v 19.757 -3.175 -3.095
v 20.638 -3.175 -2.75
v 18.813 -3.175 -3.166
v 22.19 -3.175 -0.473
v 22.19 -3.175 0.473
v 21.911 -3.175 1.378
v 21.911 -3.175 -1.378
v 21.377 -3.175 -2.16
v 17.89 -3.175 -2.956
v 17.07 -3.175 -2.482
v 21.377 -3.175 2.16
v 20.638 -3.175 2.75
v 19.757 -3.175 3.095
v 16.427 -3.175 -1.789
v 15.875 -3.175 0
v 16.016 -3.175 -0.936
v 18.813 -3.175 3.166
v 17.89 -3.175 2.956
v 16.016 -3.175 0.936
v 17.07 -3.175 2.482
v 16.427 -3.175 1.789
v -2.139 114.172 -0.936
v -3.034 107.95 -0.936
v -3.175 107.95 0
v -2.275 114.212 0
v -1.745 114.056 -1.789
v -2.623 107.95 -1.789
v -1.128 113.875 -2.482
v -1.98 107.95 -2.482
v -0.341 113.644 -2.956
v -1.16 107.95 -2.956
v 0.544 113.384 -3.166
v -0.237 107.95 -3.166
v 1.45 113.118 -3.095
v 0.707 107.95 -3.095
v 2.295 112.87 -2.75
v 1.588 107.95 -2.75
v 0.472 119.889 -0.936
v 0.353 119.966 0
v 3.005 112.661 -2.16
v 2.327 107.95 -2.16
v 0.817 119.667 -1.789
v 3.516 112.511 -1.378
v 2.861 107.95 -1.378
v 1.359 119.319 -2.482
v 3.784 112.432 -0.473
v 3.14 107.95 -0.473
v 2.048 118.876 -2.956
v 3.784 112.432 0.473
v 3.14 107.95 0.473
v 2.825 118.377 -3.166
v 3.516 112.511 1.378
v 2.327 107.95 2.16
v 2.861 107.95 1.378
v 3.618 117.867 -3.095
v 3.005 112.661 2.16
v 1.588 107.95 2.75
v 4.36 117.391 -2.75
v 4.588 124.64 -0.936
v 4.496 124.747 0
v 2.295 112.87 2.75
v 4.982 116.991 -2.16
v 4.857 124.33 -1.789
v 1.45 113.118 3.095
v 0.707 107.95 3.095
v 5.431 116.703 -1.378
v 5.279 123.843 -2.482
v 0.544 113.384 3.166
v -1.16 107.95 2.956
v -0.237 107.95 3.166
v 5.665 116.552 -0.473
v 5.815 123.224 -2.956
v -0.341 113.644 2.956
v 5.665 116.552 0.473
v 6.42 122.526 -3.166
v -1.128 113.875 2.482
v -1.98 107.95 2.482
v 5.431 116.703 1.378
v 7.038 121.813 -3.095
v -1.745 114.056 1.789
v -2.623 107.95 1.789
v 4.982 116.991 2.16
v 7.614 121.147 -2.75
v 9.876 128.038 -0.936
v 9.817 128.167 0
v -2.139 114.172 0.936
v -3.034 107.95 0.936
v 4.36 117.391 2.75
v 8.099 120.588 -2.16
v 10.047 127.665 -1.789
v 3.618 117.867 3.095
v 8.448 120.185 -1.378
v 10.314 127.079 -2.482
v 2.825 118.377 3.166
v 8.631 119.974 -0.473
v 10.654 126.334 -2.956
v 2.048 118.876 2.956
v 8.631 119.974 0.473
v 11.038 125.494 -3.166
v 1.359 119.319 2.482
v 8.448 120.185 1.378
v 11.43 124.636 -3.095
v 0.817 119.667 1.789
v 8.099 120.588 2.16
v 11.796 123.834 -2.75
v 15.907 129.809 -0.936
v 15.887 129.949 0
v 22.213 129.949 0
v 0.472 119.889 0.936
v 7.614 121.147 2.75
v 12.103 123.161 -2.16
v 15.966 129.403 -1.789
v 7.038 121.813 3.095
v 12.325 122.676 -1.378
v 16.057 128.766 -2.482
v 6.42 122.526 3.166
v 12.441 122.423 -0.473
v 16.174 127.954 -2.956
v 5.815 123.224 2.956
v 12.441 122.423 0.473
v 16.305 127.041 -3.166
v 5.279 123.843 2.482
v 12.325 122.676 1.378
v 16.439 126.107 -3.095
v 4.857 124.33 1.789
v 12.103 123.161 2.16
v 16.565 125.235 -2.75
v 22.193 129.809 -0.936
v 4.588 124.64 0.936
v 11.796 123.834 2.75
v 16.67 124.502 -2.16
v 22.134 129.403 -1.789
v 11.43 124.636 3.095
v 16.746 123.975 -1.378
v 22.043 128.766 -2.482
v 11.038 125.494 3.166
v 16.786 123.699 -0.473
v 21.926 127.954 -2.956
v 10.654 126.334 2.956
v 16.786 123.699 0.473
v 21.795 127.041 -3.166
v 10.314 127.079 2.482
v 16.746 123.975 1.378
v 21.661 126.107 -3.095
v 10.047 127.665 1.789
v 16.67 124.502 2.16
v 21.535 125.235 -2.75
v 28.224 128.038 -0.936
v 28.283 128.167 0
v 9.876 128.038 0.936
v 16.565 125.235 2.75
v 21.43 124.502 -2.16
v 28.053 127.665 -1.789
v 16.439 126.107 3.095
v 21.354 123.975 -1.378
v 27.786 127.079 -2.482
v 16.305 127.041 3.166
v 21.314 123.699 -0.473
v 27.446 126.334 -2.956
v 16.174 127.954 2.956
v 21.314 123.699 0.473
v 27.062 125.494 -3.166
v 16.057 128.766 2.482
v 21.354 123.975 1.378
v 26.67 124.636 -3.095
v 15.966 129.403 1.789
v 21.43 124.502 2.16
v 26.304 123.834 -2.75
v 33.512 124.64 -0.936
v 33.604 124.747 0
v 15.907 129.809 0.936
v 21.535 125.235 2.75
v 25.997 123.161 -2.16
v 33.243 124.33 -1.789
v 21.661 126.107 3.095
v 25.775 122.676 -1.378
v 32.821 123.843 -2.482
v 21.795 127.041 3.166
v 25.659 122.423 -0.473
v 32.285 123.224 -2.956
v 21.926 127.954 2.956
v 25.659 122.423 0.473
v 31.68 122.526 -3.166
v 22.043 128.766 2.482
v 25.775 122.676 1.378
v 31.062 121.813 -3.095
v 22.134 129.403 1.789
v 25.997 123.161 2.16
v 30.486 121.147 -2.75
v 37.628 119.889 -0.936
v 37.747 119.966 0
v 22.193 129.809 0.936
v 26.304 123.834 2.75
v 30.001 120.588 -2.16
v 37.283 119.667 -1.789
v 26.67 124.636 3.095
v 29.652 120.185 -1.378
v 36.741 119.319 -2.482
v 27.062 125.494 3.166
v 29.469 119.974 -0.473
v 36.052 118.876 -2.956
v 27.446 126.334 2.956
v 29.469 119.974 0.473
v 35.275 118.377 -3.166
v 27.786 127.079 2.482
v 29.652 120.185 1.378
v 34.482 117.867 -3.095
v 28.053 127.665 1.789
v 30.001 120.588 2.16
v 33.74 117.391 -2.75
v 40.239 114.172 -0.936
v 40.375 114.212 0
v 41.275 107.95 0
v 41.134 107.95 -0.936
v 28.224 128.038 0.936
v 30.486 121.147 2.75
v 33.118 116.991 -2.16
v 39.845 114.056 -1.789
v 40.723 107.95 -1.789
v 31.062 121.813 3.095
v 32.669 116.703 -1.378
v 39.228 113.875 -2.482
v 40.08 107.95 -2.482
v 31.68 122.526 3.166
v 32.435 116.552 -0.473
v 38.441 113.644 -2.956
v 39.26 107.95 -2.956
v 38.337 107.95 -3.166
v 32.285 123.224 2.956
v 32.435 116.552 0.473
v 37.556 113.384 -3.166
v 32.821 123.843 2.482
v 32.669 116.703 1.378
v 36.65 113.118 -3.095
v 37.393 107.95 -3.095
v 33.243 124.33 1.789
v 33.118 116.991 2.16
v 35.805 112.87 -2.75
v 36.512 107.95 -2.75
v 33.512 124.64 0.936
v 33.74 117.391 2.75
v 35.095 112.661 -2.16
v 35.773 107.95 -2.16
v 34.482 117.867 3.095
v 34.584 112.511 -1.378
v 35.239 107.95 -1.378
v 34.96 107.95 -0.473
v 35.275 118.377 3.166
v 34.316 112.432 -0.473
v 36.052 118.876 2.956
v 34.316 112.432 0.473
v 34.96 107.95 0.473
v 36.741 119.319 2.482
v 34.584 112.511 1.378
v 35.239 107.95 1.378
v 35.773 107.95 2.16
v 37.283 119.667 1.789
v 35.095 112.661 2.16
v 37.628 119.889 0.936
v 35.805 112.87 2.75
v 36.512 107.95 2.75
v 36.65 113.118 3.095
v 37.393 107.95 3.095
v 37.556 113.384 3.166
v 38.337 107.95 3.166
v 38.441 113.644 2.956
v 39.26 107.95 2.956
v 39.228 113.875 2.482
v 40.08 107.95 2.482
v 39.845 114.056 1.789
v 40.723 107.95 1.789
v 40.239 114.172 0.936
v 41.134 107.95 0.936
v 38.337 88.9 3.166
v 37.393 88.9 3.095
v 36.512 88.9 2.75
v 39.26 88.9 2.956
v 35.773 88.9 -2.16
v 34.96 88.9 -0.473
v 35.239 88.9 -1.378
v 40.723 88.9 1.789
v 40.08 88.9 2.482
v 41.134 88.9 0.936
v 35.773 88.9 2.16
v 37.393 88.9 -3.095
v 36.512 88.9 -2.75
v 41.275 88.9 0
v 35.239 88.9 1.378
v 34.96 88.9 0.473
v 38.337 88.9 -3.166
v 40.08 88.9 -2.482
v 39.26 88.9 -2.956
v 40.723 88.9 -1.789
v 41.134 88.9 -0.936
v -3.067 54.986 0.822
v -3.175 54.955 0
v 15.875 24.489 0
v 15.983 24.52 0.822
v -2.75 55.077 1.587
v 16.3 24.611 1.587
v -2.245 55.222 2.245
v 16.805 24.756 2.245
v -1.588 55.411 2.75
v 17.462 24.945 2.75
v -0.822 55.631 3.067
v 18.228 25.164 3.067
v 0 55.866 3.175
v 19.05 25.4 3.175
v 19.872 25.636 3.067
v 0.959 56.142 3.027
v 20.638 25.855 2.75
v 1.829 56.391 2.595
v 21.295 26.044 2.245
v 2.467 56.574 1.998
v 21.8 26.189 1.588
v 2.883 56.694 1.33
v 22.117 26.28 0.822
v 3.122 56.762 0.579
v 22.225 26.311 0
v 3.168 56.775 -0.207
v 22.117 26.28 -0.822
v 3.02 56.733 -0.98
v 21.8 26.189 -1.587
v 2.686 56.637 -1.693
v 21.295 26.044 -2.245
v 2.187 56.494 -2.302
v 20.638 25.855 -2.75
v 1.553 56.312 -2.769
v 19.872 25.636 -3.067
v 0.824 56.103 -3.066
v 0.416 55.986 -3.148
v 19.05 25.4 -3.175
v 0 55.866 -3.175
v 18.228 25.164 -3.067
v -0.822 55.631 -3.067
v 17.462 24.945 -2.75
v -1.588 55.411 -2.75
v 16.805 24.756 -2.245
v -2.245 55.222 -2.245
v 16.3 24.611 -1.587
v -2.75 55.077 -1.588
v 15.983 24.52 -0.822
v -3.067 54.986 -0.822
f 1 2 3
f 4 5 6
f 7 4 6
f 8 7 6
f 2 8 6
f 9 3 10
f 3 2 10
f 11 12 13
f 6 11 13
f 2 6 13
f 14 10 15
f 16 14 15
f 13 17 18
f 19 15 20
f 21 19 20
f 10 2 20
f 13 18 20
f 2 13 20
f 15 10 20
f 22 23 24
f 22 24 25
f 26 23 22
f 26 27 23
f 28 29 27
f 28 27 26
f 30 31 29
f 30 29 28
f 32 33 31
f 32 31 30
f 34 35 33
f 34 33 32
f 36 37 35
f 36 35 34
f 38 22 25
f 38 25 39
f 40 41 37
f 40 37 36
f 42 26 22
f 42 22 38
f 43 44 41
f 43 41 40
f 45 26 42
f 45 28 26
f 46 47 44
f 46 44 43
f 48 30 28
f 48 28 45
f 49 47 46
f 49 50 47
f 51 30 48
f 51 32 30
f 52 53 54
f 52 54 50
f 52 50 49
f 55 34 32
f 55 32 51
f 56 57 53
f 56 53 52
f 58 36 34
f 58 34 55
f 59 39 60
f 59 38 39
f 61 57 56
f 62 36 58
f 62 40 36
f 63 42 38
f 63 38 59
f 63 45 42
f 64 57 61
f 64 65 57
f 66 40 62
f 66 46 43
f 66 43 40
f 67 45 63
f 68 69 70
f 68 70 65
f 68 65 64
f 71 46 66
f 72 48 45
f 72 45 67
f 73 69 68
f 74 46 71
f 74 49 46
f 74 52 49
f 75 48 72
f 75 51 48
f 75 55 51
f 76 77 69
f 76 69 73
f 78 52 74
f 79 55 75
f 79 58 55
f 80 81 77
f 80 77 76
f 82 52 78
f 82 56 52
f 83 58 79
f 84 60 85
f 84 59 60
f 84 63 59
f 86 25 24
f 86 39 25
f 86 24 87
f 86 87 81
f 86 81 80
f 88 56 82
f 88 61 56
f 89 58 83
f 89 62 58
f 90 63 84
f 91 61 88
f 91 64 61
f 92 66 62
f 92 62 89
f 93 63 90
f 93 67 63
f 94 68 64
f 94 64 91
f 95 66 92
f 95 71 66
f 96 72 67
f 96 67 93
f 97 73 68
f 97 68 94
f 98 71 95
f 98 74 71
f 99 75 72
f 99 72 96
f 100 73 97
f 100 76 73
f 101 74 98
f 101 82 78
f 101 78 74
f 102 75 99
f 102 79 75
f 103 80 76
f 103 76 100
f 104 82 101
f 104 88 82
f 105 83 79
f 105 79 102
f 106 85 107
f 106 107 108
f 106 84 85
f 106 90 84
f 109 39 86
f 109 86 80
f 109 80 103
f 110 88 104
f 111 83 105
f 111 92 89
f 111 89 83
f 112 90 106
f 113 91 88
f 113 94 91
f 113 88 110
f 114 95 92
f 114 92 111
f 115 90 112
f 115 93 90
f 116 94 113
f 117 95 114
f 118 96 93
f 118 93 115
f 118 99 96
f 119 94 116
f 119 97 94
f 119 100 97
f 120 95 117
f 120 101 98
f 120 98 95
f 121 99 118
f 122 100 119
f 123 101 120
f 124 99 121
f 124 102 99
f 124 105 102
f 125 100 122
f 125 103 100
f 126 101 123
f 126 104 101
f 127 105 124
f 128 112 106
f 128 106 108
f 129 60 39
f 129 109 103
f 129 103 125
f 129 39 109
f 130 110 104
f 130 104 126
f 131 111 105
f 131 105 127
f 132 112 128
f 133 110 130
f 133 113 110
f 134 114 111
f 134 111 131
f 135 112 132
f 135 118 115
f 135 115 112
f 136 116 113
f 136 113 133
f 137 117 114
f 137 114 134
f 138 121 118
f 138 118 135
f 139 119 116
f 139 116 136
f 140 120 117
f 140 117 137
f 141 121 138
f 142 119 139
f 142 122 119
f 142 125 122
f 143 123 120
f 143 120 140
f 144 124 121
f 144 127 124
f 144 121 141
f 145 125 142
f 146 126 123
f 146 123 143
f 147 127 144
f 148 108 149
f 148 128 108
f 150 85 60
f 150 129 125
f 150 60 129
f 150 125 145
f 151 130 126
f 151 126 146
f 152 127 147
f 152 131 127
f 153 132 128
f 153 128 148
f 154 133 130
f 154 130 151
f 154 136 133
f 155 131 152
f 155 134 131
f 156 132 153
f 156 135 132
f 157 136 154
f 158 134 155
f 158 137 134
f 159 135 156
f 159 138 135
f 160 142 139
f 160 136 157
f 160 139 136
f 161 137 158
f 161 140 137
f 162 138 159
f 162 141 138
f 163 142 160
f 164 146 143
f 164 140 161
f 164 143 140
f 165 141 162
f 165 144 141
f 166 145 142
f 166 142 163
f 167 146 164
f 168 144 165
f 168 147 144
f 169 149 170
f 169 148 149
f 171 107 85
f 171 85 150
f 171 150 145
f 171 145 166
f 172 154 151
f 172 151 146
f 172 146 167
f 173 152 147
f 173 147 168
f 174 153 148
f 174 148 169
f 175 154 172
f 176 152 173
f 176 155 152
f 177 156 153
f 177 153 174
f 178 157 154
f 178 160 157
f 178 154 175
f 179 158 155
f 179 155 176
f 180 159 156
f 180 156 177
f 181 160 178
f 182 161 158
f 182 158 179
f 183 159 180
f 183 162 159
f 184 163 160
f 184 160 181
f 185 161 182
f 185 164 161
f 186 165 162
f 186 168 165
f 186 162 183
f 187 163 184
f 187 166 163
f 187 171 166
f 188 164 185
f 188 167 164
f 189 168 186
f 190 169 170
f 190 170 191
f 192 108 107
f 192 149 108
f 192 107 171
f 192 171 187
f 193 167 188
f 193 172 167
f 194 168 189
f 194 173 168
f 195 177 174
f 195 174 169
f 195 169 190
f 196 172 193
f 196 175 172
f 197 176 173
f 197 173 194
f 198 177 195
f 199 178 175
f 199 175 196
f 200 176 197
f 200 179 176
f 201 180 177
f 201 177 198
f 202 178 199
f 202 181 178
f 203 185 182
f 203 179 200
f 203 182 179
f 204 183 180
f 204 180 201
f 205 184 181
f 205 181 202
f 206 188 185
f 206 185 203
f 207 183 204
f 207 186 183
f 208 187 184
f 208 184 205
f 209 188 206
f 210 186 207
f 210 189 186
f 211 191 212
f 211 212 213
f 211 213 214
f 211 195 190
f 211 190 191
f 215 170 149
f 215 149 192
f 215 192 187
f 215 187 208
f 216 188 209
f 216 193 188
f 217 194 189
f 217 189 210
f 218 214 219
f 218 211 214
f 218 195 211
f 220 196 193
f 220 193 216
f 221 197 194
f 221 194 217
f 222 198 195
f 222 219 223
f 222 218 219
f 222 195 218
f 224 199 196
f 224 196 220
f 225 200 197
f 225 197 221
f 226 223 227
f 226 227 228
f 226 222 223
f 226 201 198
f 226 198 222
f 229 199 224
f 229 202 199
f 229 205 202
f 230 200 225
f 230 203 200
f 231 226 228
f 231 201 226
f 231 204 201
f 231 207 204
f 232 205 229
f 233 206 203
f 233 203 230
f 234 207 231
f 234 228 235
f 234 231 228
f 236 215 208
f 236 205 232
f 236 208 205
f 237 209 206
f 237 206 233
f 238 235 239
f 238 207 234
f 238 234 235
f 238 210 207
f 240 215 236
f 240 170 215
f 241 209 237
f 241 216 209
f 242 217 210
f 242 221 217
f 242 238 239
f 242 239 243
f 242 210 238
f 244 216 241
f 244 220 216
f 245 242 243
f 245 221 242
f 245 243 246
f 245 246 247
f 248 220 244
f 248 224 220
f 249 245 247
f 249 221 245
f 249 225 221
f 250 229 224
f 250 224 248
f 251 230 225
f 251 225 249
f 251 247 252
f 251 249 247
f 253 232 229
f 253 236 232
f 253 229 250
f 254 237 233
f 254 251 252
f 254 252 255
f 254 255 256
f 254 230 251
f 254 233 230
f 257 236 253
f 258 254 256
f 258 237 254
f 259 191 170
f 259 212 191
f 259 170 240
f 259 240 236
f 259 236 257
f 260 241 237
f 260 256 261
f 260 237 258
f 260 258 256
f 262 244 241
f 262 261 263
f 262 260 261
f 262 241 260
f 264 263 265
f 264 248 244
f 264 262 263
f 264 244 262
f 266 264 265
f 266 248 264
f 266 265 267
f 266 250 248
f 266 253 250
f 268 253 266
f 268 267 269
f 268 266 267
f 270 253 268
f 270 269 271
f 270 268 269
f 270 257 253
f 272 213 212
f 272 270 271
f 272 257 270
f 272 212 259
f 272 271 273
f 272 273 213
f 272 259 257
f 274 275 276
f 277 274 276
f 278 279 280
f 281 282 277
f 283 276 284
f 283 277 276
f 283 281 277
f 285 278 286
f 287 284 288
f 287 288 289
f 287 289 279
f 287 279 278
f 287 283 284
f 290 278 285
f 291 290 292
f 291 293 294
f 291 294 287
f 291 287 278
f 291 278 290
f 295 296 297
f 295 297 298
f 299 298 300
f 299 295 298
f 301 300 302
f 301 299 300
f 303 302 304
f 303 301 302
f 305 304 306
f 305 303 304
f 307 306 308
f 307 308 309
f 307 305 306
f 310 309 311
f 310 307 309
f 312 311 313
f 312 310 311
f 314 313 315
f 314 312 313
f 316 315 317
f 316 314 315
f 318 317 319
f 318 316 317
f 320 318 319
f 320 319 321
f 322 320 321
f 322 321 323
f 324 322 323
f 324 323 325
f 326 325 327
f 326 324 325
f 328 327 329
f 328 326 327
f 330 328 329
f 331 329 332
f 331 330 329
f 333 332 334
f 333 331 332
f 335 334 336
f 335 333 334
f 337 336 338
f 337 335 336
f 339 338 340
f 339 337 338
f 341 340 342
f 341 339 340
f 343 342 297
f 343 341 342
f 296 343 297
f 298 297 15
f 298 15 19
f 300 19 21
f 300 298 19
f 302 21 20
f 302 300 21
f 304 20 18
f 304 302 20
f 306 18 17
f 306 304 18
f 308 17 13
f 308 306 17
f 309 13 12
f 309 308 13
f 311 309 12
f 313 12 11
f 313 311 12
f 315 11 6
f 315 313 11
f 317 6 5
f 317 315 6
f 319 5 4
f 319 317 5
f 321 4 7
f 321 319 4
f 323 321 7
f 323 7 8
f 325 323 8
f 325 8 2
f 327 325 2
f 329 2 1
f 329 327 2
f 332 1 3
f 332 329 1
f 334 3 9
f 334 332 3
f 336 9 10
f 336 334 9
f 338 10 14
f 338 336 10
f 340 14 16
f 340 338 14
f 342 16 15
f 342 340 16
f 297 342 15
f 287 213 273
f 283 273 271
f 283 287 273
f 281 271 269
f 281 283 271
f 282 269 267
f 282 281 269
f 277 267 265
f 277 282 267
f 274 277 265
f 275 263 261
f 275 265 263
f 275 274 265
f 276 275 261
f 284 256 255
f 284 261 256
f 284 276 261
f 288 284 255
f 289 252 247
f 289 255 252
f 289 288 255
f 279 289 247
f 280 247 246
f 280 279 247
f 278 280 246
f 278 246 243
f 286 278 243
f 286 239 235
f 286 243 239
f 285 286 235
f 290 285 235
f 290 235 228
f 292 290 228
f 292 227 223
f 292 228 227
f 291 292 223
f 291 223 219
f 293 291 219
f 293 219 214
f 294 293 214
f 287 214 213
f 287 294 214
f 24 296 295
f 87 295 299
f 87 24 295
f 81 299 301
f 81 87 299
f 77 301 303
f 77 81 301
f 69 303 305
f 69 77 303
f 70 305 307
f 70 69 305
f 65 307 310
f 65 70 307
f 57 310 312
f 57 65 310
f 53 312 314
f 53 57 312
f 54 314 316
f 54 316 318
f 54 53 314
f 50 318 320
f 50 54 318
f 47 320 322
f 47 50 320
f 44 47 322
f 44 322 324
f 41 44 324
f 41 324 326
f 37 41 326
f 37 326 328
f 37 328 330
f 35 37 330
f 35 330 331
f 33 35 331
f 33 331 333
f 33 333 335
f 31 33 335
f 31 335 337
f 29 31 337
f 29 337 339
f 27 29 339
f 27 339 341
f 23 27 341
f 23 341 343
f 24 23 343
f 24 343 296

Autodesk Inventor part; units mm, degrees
ref_plane "YZ Plane" through (0, 0, 0) normal (1, 0, 0) x (0, 1, 0)
ref_plane "XZ Plane" through (0, 0, 0) normal (0, 1, 0) x (-1, 0, 0)
sketch "Sketch1" plane through (0, 0, 0) normal (0, 0, 1) x (1, 0, 0)
  line L0 (19.05, 0) -> (19.05, 25.4)
  line L1 (19.05, 25.4) -> (0, 55.8663)
  arc A0 (38.1, 107.95) -> (0, 107.95) centre (19.05, 107.95) ccw
  line L2 (0, 55.8663) -> (0, 107.95)
  line L3 (38.1, 88.9) -> (38.1, 107.95)
  point P0 (0, 0)
  dimension "d2" = 25.4
ref_plane "Work Plane1" through (19.05, 0, 0) normal (0, 1, 0) x (-1, 0, 0)
sketch "Sketch2" plane through (19.05, 0, 0) normal (0, 1, 0) x (-1, 0, 0)
  circle A0 centre (0, 0) radius 3.175
  point P0 (19.05, 0)
  dimension "d6" = 6.35
sweep "Sweep1" add profiles "Sketch2" path "Sketch1"
sketch "Sketch3" plane through (19.05, 0, 0) normal (0, 1, 0) x (-1, 0, 0)
  circle A0 centre (0, 0) radius 3.175
  point P0 (19.05, 0)
  dimension "d8" = 6.35
extrude "Extrusion1" add sketch "Sketch3" against normal blind 3.175
ref_plane "Work Plane3" through (19.05, 11.1125, 0) normal (0, -1, 0) x (1, 0, 0)
ref_plane "Work Plane2" through (19.05, -3.175, 0) normal (0, -1, 0) x (1, 0, 0)
split_face "Split1"
thread "Thread1" size "1/4-20 UNC" class "2A" standard "ANSI Unified Screw Threads" full length
sketch "Sketch4" plane through (38.1, 88.9, 0) normal (0, -1, 0) x (1, 0, 0)
  circle A0 centre (0, 0) radius 3.175 projected
  point P0 (-38.1, 0)
  point P1 (3.175, 0)
  point P2 (-3.1732, -0.1068)
sketch "Sketch5" plane through (19.05, -3.175, 0) normal (0, -1, 0) x (1, 0, 0)
  circle A0 centre (0, 0) radius 3.175 projected
  point P0 (-19.05, 0)
  point P1 (3.175, 0)
ref_plane "Work Plane6" through (41.275, 88.9, 0) normal (-0.0168, 0.0035, 0.9999) x (-0.9999, 0, -0.0168)
properties part number "hook prototype"
